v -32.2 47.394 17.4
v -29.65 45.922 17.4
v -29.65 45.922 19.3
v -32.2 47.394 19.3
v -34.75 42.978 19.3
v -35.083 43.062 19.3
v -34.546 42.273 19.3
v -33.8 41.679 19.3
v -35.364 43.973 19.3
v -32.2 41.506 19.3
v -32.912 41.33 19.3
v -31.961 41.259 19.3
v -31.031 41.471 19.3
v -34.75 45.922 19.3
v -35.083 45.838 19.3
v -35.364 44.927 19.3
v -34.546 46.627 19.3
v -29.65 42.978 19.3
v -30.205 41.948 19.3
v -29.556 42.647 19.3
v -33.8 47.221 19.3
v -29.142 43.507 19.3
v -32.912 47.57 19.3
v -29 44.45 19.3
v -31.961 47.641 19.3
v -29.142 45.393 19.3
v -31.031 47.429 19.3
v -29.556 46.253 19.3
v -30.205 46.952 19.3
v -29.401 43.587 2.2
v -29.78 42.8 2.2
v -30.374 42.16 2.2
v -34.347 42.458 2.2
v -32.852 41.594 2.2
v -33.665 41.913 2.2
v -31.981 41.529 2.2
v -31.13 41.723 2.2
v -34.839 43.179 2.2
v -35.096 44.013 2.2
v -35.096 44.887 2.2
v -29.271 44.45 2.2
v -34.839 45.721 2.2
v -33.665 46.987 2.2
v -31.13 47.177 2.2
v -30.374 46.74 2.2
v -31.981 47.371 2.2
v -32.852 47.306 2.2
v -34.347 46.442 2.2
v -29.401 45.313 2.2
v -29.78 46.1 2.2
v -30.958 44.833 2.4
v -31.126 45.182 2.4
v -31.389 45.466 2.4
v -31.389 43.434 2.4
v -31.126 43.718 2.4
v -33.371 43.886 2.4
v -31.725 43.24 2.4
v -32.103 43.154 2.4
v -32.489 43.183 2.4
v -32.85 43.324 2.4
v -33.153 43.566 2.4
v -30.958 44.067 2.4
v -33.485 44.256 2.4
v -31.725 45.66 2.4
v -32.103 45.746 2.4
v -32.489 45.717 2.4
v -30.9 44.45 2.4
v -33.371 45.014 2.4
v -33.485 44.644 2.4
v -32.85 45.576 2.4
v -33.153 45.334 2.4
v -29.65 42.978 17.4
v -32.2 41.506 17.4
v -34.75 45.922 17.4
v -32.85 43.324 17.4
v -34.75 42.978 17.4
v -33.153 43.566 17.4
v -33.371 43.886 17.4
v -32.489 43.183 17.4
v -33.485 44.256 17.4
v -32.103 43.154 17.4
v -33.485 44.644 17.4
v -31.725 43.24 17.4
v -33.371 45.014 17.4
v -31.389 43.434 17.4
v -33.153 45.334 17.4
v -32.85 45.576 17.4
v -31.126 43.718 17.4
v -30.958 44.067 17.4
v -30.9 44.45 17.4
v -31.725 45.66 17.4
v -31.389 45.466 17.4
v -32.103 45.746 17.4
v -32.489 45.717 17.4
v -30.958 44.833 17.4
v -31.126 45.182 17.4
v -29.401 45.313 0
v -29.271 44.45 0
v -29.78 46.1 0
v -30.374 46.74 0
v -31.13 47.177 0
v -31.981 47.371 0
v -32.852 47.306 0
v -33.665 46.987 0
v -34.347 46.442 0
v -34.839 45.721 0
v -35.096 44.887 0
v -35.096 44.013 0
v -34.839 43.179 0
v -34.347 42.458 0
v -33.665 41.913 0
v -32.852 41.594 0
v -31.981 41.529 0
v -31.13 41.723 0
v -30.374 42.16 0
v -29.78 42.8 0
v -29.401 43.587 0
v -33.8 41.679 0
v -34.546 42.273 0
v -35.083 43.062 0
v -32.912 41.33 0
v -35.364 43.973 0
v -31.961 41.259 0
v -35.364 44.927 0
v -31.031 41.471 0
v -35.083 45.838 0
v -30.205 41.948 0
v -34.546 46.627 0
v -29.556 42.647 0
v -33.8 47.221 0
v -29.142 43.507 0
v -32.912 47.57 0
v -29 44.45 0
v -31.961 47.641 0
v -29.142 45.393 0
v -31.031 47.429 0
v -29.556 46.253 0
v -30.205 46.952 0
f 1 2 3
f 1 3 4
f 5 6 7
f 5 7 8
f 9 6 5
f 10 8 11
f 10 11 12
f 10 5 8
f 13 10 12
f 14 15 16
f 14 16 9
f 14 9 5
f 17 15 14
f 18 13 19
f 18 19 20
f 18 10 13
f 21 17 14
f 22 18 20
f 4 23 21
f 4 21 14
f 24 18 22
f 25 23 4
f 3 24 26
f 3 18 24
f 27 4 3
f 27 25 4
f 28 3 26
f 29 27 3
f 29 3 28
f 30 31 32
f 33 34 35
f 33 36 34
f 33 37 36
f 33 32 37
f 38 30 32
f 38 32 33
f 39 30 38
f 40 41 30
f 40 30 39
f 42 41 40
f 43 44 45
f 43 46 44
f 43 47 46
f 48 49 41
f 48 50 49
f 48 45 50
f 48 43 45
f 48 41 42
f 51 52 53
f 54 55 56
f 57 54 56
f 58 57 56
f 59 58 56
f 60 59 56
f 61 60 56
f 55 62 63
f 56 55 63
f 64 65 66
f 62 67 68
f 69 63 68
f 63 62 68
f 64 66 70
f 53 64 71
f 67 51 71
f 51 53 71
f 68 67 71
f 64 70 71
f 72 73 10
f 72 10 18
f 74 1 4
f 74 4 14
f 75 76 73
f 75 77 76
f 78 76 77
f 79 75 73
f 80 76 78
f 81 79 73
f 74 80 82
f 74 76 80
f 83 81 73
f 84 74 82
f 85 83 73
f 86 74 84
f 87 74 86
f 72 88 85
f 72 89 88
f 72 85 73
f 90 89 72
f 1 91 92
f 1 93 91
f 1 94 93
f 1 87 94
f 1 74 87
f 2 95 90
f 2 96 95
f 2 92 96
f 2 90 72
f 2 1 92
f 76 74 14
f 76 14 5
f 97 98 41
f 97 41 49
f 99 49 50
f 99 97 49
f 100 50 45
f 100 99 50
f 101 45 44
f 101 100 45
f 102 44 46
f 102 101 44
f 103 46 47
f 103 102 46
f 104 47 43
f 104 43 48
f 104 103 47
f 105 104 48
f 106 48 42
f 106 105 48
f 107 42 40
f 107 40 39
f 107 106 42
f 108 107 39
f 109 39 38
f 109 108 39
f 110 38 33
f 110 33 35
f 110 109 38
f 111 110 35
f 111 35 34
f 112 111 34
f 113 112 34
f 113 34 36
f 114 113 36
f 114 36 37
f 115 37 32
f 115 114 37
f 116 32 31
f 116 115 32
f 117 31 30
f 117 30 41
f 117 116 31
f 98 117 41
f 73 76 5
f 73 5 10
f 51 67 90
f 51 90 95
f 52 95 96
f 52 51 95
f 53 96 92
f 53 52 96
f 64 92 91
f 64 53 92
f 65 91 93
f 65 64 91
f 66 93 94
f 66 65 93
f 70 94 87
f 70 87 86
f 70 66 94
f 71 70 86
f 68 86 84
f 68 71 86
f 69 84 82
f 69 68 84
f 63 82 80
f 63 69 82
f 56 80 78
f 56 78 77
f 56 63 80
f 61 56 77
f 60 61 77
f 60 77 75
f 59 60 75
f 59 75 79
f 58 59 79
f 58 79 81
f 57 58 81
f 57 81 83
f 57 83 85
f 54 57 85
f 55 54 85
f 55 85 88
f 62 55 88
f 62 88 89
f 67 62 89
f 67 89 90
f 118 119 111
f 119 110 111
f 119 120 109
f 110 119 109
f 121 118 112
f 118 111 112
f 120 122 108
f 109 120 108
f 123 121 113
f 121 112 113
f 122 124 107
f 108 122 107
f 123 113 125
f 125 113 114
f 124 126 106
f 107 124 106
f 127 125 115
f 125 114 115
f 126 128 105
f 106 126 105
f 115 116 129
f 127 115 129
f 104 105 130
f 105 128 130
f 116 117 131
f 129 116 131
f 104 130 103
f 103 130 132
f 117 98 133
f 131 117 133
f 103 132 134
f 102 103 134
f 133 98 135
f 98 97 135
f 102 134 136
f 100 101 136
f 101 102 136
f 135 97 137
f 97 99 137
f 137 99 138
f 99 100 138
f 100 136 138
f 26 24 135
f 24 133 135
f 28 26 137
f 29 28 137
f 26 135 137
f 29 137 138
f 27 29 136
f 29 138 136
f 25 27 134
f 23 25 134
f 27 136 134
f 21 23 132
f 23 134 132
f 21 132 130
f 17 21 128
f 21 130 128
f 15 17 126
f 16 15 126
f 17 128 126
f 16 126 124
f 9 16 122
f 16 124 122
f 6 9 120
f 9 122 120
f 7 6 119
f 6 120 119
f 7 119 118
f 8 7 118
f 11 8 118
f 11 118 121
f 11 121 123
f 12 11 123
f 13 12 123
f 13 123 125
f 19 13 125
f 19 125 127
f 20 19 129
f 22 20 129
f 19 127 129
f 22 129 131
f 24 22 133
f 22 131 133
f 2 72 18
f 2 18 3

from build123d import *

# Parameters (mm, degrees)
SKETCH1_R           = 3.2
SKETCH1_R_2         = 2.929016319
BOSS_EXTRUDE1_DEPTH = 2.2
SKETCH2_R           = 3.2
SKETCH2_R_2         = 1.3
BOSS_EXTRUDE2_DEPTH = 15.2
SKETCH3_R           = 3.2
BOSS_EXTRUDE3_DEPTH = 1.9
SKETCH4_R           = 1.3
BOSS_EXTRUDE4_DEPTH = 0.2


with BuildPart() as part:
    # Sketch1 → Boss-Extrude1 (new body)
    with BuildSketch(Plane.XY):
        with Locations((-32.2, 44.45)):
            Circle(SKETCH1_R)
        with Locations((-32.2, 44.45)):
            Circle(SKETCH1_R_2, mode=Mode.SUBTRACT)
    extrude(amount=BOSS_EXTRUDE1_DEPTH)

    # Sketch2 → Boss-Extrude2 (add)
    with BuildSketch(Plane.XY.offset(2.2)):
        with Locations((-32.2, 44.45)):
            Circle(SKETCH2_R)
        with Locations((-32.2, 44.45)):
            Circle(SKETCH2_R_2, mode=Mode.SUBTRACT)
    extrude(amount=BOSS_EXTRUDE2_DEPTH)

    # Sketch3 → Boss-Extrude3 (add)
    with BuildSketch(Plane.XY.offset(17.4)):
        with Locations((-32.2, 44.45)):
            Circle(SKETCH3_R)
        Polygon((-34.75, 42.977756814), (-32.2, 41.505513627), (-29.65, 42.977756814), (-29.65, 45.922243186), (-32.2, 47.394486373), (-34.75, 45.922243186), align=None, mode=Mode.SUBTRACT)
    extrude(amount=BOSS_EXTRUDE3_DEPTH)

    # Sketch4 → Boss-Extrude4 (add)
    with BuildSketch(Plane(origin=(0, 0, 2.2), x_dir=(-1, 0, 0), z_dir=(0, 0, -1))):
        with Locations((32.2, 44.45)):
            Circle(SKETCH4_R)
    extrude(amount=-BOSS_EXTRUDE4_DEPTH)


solid = part.part
